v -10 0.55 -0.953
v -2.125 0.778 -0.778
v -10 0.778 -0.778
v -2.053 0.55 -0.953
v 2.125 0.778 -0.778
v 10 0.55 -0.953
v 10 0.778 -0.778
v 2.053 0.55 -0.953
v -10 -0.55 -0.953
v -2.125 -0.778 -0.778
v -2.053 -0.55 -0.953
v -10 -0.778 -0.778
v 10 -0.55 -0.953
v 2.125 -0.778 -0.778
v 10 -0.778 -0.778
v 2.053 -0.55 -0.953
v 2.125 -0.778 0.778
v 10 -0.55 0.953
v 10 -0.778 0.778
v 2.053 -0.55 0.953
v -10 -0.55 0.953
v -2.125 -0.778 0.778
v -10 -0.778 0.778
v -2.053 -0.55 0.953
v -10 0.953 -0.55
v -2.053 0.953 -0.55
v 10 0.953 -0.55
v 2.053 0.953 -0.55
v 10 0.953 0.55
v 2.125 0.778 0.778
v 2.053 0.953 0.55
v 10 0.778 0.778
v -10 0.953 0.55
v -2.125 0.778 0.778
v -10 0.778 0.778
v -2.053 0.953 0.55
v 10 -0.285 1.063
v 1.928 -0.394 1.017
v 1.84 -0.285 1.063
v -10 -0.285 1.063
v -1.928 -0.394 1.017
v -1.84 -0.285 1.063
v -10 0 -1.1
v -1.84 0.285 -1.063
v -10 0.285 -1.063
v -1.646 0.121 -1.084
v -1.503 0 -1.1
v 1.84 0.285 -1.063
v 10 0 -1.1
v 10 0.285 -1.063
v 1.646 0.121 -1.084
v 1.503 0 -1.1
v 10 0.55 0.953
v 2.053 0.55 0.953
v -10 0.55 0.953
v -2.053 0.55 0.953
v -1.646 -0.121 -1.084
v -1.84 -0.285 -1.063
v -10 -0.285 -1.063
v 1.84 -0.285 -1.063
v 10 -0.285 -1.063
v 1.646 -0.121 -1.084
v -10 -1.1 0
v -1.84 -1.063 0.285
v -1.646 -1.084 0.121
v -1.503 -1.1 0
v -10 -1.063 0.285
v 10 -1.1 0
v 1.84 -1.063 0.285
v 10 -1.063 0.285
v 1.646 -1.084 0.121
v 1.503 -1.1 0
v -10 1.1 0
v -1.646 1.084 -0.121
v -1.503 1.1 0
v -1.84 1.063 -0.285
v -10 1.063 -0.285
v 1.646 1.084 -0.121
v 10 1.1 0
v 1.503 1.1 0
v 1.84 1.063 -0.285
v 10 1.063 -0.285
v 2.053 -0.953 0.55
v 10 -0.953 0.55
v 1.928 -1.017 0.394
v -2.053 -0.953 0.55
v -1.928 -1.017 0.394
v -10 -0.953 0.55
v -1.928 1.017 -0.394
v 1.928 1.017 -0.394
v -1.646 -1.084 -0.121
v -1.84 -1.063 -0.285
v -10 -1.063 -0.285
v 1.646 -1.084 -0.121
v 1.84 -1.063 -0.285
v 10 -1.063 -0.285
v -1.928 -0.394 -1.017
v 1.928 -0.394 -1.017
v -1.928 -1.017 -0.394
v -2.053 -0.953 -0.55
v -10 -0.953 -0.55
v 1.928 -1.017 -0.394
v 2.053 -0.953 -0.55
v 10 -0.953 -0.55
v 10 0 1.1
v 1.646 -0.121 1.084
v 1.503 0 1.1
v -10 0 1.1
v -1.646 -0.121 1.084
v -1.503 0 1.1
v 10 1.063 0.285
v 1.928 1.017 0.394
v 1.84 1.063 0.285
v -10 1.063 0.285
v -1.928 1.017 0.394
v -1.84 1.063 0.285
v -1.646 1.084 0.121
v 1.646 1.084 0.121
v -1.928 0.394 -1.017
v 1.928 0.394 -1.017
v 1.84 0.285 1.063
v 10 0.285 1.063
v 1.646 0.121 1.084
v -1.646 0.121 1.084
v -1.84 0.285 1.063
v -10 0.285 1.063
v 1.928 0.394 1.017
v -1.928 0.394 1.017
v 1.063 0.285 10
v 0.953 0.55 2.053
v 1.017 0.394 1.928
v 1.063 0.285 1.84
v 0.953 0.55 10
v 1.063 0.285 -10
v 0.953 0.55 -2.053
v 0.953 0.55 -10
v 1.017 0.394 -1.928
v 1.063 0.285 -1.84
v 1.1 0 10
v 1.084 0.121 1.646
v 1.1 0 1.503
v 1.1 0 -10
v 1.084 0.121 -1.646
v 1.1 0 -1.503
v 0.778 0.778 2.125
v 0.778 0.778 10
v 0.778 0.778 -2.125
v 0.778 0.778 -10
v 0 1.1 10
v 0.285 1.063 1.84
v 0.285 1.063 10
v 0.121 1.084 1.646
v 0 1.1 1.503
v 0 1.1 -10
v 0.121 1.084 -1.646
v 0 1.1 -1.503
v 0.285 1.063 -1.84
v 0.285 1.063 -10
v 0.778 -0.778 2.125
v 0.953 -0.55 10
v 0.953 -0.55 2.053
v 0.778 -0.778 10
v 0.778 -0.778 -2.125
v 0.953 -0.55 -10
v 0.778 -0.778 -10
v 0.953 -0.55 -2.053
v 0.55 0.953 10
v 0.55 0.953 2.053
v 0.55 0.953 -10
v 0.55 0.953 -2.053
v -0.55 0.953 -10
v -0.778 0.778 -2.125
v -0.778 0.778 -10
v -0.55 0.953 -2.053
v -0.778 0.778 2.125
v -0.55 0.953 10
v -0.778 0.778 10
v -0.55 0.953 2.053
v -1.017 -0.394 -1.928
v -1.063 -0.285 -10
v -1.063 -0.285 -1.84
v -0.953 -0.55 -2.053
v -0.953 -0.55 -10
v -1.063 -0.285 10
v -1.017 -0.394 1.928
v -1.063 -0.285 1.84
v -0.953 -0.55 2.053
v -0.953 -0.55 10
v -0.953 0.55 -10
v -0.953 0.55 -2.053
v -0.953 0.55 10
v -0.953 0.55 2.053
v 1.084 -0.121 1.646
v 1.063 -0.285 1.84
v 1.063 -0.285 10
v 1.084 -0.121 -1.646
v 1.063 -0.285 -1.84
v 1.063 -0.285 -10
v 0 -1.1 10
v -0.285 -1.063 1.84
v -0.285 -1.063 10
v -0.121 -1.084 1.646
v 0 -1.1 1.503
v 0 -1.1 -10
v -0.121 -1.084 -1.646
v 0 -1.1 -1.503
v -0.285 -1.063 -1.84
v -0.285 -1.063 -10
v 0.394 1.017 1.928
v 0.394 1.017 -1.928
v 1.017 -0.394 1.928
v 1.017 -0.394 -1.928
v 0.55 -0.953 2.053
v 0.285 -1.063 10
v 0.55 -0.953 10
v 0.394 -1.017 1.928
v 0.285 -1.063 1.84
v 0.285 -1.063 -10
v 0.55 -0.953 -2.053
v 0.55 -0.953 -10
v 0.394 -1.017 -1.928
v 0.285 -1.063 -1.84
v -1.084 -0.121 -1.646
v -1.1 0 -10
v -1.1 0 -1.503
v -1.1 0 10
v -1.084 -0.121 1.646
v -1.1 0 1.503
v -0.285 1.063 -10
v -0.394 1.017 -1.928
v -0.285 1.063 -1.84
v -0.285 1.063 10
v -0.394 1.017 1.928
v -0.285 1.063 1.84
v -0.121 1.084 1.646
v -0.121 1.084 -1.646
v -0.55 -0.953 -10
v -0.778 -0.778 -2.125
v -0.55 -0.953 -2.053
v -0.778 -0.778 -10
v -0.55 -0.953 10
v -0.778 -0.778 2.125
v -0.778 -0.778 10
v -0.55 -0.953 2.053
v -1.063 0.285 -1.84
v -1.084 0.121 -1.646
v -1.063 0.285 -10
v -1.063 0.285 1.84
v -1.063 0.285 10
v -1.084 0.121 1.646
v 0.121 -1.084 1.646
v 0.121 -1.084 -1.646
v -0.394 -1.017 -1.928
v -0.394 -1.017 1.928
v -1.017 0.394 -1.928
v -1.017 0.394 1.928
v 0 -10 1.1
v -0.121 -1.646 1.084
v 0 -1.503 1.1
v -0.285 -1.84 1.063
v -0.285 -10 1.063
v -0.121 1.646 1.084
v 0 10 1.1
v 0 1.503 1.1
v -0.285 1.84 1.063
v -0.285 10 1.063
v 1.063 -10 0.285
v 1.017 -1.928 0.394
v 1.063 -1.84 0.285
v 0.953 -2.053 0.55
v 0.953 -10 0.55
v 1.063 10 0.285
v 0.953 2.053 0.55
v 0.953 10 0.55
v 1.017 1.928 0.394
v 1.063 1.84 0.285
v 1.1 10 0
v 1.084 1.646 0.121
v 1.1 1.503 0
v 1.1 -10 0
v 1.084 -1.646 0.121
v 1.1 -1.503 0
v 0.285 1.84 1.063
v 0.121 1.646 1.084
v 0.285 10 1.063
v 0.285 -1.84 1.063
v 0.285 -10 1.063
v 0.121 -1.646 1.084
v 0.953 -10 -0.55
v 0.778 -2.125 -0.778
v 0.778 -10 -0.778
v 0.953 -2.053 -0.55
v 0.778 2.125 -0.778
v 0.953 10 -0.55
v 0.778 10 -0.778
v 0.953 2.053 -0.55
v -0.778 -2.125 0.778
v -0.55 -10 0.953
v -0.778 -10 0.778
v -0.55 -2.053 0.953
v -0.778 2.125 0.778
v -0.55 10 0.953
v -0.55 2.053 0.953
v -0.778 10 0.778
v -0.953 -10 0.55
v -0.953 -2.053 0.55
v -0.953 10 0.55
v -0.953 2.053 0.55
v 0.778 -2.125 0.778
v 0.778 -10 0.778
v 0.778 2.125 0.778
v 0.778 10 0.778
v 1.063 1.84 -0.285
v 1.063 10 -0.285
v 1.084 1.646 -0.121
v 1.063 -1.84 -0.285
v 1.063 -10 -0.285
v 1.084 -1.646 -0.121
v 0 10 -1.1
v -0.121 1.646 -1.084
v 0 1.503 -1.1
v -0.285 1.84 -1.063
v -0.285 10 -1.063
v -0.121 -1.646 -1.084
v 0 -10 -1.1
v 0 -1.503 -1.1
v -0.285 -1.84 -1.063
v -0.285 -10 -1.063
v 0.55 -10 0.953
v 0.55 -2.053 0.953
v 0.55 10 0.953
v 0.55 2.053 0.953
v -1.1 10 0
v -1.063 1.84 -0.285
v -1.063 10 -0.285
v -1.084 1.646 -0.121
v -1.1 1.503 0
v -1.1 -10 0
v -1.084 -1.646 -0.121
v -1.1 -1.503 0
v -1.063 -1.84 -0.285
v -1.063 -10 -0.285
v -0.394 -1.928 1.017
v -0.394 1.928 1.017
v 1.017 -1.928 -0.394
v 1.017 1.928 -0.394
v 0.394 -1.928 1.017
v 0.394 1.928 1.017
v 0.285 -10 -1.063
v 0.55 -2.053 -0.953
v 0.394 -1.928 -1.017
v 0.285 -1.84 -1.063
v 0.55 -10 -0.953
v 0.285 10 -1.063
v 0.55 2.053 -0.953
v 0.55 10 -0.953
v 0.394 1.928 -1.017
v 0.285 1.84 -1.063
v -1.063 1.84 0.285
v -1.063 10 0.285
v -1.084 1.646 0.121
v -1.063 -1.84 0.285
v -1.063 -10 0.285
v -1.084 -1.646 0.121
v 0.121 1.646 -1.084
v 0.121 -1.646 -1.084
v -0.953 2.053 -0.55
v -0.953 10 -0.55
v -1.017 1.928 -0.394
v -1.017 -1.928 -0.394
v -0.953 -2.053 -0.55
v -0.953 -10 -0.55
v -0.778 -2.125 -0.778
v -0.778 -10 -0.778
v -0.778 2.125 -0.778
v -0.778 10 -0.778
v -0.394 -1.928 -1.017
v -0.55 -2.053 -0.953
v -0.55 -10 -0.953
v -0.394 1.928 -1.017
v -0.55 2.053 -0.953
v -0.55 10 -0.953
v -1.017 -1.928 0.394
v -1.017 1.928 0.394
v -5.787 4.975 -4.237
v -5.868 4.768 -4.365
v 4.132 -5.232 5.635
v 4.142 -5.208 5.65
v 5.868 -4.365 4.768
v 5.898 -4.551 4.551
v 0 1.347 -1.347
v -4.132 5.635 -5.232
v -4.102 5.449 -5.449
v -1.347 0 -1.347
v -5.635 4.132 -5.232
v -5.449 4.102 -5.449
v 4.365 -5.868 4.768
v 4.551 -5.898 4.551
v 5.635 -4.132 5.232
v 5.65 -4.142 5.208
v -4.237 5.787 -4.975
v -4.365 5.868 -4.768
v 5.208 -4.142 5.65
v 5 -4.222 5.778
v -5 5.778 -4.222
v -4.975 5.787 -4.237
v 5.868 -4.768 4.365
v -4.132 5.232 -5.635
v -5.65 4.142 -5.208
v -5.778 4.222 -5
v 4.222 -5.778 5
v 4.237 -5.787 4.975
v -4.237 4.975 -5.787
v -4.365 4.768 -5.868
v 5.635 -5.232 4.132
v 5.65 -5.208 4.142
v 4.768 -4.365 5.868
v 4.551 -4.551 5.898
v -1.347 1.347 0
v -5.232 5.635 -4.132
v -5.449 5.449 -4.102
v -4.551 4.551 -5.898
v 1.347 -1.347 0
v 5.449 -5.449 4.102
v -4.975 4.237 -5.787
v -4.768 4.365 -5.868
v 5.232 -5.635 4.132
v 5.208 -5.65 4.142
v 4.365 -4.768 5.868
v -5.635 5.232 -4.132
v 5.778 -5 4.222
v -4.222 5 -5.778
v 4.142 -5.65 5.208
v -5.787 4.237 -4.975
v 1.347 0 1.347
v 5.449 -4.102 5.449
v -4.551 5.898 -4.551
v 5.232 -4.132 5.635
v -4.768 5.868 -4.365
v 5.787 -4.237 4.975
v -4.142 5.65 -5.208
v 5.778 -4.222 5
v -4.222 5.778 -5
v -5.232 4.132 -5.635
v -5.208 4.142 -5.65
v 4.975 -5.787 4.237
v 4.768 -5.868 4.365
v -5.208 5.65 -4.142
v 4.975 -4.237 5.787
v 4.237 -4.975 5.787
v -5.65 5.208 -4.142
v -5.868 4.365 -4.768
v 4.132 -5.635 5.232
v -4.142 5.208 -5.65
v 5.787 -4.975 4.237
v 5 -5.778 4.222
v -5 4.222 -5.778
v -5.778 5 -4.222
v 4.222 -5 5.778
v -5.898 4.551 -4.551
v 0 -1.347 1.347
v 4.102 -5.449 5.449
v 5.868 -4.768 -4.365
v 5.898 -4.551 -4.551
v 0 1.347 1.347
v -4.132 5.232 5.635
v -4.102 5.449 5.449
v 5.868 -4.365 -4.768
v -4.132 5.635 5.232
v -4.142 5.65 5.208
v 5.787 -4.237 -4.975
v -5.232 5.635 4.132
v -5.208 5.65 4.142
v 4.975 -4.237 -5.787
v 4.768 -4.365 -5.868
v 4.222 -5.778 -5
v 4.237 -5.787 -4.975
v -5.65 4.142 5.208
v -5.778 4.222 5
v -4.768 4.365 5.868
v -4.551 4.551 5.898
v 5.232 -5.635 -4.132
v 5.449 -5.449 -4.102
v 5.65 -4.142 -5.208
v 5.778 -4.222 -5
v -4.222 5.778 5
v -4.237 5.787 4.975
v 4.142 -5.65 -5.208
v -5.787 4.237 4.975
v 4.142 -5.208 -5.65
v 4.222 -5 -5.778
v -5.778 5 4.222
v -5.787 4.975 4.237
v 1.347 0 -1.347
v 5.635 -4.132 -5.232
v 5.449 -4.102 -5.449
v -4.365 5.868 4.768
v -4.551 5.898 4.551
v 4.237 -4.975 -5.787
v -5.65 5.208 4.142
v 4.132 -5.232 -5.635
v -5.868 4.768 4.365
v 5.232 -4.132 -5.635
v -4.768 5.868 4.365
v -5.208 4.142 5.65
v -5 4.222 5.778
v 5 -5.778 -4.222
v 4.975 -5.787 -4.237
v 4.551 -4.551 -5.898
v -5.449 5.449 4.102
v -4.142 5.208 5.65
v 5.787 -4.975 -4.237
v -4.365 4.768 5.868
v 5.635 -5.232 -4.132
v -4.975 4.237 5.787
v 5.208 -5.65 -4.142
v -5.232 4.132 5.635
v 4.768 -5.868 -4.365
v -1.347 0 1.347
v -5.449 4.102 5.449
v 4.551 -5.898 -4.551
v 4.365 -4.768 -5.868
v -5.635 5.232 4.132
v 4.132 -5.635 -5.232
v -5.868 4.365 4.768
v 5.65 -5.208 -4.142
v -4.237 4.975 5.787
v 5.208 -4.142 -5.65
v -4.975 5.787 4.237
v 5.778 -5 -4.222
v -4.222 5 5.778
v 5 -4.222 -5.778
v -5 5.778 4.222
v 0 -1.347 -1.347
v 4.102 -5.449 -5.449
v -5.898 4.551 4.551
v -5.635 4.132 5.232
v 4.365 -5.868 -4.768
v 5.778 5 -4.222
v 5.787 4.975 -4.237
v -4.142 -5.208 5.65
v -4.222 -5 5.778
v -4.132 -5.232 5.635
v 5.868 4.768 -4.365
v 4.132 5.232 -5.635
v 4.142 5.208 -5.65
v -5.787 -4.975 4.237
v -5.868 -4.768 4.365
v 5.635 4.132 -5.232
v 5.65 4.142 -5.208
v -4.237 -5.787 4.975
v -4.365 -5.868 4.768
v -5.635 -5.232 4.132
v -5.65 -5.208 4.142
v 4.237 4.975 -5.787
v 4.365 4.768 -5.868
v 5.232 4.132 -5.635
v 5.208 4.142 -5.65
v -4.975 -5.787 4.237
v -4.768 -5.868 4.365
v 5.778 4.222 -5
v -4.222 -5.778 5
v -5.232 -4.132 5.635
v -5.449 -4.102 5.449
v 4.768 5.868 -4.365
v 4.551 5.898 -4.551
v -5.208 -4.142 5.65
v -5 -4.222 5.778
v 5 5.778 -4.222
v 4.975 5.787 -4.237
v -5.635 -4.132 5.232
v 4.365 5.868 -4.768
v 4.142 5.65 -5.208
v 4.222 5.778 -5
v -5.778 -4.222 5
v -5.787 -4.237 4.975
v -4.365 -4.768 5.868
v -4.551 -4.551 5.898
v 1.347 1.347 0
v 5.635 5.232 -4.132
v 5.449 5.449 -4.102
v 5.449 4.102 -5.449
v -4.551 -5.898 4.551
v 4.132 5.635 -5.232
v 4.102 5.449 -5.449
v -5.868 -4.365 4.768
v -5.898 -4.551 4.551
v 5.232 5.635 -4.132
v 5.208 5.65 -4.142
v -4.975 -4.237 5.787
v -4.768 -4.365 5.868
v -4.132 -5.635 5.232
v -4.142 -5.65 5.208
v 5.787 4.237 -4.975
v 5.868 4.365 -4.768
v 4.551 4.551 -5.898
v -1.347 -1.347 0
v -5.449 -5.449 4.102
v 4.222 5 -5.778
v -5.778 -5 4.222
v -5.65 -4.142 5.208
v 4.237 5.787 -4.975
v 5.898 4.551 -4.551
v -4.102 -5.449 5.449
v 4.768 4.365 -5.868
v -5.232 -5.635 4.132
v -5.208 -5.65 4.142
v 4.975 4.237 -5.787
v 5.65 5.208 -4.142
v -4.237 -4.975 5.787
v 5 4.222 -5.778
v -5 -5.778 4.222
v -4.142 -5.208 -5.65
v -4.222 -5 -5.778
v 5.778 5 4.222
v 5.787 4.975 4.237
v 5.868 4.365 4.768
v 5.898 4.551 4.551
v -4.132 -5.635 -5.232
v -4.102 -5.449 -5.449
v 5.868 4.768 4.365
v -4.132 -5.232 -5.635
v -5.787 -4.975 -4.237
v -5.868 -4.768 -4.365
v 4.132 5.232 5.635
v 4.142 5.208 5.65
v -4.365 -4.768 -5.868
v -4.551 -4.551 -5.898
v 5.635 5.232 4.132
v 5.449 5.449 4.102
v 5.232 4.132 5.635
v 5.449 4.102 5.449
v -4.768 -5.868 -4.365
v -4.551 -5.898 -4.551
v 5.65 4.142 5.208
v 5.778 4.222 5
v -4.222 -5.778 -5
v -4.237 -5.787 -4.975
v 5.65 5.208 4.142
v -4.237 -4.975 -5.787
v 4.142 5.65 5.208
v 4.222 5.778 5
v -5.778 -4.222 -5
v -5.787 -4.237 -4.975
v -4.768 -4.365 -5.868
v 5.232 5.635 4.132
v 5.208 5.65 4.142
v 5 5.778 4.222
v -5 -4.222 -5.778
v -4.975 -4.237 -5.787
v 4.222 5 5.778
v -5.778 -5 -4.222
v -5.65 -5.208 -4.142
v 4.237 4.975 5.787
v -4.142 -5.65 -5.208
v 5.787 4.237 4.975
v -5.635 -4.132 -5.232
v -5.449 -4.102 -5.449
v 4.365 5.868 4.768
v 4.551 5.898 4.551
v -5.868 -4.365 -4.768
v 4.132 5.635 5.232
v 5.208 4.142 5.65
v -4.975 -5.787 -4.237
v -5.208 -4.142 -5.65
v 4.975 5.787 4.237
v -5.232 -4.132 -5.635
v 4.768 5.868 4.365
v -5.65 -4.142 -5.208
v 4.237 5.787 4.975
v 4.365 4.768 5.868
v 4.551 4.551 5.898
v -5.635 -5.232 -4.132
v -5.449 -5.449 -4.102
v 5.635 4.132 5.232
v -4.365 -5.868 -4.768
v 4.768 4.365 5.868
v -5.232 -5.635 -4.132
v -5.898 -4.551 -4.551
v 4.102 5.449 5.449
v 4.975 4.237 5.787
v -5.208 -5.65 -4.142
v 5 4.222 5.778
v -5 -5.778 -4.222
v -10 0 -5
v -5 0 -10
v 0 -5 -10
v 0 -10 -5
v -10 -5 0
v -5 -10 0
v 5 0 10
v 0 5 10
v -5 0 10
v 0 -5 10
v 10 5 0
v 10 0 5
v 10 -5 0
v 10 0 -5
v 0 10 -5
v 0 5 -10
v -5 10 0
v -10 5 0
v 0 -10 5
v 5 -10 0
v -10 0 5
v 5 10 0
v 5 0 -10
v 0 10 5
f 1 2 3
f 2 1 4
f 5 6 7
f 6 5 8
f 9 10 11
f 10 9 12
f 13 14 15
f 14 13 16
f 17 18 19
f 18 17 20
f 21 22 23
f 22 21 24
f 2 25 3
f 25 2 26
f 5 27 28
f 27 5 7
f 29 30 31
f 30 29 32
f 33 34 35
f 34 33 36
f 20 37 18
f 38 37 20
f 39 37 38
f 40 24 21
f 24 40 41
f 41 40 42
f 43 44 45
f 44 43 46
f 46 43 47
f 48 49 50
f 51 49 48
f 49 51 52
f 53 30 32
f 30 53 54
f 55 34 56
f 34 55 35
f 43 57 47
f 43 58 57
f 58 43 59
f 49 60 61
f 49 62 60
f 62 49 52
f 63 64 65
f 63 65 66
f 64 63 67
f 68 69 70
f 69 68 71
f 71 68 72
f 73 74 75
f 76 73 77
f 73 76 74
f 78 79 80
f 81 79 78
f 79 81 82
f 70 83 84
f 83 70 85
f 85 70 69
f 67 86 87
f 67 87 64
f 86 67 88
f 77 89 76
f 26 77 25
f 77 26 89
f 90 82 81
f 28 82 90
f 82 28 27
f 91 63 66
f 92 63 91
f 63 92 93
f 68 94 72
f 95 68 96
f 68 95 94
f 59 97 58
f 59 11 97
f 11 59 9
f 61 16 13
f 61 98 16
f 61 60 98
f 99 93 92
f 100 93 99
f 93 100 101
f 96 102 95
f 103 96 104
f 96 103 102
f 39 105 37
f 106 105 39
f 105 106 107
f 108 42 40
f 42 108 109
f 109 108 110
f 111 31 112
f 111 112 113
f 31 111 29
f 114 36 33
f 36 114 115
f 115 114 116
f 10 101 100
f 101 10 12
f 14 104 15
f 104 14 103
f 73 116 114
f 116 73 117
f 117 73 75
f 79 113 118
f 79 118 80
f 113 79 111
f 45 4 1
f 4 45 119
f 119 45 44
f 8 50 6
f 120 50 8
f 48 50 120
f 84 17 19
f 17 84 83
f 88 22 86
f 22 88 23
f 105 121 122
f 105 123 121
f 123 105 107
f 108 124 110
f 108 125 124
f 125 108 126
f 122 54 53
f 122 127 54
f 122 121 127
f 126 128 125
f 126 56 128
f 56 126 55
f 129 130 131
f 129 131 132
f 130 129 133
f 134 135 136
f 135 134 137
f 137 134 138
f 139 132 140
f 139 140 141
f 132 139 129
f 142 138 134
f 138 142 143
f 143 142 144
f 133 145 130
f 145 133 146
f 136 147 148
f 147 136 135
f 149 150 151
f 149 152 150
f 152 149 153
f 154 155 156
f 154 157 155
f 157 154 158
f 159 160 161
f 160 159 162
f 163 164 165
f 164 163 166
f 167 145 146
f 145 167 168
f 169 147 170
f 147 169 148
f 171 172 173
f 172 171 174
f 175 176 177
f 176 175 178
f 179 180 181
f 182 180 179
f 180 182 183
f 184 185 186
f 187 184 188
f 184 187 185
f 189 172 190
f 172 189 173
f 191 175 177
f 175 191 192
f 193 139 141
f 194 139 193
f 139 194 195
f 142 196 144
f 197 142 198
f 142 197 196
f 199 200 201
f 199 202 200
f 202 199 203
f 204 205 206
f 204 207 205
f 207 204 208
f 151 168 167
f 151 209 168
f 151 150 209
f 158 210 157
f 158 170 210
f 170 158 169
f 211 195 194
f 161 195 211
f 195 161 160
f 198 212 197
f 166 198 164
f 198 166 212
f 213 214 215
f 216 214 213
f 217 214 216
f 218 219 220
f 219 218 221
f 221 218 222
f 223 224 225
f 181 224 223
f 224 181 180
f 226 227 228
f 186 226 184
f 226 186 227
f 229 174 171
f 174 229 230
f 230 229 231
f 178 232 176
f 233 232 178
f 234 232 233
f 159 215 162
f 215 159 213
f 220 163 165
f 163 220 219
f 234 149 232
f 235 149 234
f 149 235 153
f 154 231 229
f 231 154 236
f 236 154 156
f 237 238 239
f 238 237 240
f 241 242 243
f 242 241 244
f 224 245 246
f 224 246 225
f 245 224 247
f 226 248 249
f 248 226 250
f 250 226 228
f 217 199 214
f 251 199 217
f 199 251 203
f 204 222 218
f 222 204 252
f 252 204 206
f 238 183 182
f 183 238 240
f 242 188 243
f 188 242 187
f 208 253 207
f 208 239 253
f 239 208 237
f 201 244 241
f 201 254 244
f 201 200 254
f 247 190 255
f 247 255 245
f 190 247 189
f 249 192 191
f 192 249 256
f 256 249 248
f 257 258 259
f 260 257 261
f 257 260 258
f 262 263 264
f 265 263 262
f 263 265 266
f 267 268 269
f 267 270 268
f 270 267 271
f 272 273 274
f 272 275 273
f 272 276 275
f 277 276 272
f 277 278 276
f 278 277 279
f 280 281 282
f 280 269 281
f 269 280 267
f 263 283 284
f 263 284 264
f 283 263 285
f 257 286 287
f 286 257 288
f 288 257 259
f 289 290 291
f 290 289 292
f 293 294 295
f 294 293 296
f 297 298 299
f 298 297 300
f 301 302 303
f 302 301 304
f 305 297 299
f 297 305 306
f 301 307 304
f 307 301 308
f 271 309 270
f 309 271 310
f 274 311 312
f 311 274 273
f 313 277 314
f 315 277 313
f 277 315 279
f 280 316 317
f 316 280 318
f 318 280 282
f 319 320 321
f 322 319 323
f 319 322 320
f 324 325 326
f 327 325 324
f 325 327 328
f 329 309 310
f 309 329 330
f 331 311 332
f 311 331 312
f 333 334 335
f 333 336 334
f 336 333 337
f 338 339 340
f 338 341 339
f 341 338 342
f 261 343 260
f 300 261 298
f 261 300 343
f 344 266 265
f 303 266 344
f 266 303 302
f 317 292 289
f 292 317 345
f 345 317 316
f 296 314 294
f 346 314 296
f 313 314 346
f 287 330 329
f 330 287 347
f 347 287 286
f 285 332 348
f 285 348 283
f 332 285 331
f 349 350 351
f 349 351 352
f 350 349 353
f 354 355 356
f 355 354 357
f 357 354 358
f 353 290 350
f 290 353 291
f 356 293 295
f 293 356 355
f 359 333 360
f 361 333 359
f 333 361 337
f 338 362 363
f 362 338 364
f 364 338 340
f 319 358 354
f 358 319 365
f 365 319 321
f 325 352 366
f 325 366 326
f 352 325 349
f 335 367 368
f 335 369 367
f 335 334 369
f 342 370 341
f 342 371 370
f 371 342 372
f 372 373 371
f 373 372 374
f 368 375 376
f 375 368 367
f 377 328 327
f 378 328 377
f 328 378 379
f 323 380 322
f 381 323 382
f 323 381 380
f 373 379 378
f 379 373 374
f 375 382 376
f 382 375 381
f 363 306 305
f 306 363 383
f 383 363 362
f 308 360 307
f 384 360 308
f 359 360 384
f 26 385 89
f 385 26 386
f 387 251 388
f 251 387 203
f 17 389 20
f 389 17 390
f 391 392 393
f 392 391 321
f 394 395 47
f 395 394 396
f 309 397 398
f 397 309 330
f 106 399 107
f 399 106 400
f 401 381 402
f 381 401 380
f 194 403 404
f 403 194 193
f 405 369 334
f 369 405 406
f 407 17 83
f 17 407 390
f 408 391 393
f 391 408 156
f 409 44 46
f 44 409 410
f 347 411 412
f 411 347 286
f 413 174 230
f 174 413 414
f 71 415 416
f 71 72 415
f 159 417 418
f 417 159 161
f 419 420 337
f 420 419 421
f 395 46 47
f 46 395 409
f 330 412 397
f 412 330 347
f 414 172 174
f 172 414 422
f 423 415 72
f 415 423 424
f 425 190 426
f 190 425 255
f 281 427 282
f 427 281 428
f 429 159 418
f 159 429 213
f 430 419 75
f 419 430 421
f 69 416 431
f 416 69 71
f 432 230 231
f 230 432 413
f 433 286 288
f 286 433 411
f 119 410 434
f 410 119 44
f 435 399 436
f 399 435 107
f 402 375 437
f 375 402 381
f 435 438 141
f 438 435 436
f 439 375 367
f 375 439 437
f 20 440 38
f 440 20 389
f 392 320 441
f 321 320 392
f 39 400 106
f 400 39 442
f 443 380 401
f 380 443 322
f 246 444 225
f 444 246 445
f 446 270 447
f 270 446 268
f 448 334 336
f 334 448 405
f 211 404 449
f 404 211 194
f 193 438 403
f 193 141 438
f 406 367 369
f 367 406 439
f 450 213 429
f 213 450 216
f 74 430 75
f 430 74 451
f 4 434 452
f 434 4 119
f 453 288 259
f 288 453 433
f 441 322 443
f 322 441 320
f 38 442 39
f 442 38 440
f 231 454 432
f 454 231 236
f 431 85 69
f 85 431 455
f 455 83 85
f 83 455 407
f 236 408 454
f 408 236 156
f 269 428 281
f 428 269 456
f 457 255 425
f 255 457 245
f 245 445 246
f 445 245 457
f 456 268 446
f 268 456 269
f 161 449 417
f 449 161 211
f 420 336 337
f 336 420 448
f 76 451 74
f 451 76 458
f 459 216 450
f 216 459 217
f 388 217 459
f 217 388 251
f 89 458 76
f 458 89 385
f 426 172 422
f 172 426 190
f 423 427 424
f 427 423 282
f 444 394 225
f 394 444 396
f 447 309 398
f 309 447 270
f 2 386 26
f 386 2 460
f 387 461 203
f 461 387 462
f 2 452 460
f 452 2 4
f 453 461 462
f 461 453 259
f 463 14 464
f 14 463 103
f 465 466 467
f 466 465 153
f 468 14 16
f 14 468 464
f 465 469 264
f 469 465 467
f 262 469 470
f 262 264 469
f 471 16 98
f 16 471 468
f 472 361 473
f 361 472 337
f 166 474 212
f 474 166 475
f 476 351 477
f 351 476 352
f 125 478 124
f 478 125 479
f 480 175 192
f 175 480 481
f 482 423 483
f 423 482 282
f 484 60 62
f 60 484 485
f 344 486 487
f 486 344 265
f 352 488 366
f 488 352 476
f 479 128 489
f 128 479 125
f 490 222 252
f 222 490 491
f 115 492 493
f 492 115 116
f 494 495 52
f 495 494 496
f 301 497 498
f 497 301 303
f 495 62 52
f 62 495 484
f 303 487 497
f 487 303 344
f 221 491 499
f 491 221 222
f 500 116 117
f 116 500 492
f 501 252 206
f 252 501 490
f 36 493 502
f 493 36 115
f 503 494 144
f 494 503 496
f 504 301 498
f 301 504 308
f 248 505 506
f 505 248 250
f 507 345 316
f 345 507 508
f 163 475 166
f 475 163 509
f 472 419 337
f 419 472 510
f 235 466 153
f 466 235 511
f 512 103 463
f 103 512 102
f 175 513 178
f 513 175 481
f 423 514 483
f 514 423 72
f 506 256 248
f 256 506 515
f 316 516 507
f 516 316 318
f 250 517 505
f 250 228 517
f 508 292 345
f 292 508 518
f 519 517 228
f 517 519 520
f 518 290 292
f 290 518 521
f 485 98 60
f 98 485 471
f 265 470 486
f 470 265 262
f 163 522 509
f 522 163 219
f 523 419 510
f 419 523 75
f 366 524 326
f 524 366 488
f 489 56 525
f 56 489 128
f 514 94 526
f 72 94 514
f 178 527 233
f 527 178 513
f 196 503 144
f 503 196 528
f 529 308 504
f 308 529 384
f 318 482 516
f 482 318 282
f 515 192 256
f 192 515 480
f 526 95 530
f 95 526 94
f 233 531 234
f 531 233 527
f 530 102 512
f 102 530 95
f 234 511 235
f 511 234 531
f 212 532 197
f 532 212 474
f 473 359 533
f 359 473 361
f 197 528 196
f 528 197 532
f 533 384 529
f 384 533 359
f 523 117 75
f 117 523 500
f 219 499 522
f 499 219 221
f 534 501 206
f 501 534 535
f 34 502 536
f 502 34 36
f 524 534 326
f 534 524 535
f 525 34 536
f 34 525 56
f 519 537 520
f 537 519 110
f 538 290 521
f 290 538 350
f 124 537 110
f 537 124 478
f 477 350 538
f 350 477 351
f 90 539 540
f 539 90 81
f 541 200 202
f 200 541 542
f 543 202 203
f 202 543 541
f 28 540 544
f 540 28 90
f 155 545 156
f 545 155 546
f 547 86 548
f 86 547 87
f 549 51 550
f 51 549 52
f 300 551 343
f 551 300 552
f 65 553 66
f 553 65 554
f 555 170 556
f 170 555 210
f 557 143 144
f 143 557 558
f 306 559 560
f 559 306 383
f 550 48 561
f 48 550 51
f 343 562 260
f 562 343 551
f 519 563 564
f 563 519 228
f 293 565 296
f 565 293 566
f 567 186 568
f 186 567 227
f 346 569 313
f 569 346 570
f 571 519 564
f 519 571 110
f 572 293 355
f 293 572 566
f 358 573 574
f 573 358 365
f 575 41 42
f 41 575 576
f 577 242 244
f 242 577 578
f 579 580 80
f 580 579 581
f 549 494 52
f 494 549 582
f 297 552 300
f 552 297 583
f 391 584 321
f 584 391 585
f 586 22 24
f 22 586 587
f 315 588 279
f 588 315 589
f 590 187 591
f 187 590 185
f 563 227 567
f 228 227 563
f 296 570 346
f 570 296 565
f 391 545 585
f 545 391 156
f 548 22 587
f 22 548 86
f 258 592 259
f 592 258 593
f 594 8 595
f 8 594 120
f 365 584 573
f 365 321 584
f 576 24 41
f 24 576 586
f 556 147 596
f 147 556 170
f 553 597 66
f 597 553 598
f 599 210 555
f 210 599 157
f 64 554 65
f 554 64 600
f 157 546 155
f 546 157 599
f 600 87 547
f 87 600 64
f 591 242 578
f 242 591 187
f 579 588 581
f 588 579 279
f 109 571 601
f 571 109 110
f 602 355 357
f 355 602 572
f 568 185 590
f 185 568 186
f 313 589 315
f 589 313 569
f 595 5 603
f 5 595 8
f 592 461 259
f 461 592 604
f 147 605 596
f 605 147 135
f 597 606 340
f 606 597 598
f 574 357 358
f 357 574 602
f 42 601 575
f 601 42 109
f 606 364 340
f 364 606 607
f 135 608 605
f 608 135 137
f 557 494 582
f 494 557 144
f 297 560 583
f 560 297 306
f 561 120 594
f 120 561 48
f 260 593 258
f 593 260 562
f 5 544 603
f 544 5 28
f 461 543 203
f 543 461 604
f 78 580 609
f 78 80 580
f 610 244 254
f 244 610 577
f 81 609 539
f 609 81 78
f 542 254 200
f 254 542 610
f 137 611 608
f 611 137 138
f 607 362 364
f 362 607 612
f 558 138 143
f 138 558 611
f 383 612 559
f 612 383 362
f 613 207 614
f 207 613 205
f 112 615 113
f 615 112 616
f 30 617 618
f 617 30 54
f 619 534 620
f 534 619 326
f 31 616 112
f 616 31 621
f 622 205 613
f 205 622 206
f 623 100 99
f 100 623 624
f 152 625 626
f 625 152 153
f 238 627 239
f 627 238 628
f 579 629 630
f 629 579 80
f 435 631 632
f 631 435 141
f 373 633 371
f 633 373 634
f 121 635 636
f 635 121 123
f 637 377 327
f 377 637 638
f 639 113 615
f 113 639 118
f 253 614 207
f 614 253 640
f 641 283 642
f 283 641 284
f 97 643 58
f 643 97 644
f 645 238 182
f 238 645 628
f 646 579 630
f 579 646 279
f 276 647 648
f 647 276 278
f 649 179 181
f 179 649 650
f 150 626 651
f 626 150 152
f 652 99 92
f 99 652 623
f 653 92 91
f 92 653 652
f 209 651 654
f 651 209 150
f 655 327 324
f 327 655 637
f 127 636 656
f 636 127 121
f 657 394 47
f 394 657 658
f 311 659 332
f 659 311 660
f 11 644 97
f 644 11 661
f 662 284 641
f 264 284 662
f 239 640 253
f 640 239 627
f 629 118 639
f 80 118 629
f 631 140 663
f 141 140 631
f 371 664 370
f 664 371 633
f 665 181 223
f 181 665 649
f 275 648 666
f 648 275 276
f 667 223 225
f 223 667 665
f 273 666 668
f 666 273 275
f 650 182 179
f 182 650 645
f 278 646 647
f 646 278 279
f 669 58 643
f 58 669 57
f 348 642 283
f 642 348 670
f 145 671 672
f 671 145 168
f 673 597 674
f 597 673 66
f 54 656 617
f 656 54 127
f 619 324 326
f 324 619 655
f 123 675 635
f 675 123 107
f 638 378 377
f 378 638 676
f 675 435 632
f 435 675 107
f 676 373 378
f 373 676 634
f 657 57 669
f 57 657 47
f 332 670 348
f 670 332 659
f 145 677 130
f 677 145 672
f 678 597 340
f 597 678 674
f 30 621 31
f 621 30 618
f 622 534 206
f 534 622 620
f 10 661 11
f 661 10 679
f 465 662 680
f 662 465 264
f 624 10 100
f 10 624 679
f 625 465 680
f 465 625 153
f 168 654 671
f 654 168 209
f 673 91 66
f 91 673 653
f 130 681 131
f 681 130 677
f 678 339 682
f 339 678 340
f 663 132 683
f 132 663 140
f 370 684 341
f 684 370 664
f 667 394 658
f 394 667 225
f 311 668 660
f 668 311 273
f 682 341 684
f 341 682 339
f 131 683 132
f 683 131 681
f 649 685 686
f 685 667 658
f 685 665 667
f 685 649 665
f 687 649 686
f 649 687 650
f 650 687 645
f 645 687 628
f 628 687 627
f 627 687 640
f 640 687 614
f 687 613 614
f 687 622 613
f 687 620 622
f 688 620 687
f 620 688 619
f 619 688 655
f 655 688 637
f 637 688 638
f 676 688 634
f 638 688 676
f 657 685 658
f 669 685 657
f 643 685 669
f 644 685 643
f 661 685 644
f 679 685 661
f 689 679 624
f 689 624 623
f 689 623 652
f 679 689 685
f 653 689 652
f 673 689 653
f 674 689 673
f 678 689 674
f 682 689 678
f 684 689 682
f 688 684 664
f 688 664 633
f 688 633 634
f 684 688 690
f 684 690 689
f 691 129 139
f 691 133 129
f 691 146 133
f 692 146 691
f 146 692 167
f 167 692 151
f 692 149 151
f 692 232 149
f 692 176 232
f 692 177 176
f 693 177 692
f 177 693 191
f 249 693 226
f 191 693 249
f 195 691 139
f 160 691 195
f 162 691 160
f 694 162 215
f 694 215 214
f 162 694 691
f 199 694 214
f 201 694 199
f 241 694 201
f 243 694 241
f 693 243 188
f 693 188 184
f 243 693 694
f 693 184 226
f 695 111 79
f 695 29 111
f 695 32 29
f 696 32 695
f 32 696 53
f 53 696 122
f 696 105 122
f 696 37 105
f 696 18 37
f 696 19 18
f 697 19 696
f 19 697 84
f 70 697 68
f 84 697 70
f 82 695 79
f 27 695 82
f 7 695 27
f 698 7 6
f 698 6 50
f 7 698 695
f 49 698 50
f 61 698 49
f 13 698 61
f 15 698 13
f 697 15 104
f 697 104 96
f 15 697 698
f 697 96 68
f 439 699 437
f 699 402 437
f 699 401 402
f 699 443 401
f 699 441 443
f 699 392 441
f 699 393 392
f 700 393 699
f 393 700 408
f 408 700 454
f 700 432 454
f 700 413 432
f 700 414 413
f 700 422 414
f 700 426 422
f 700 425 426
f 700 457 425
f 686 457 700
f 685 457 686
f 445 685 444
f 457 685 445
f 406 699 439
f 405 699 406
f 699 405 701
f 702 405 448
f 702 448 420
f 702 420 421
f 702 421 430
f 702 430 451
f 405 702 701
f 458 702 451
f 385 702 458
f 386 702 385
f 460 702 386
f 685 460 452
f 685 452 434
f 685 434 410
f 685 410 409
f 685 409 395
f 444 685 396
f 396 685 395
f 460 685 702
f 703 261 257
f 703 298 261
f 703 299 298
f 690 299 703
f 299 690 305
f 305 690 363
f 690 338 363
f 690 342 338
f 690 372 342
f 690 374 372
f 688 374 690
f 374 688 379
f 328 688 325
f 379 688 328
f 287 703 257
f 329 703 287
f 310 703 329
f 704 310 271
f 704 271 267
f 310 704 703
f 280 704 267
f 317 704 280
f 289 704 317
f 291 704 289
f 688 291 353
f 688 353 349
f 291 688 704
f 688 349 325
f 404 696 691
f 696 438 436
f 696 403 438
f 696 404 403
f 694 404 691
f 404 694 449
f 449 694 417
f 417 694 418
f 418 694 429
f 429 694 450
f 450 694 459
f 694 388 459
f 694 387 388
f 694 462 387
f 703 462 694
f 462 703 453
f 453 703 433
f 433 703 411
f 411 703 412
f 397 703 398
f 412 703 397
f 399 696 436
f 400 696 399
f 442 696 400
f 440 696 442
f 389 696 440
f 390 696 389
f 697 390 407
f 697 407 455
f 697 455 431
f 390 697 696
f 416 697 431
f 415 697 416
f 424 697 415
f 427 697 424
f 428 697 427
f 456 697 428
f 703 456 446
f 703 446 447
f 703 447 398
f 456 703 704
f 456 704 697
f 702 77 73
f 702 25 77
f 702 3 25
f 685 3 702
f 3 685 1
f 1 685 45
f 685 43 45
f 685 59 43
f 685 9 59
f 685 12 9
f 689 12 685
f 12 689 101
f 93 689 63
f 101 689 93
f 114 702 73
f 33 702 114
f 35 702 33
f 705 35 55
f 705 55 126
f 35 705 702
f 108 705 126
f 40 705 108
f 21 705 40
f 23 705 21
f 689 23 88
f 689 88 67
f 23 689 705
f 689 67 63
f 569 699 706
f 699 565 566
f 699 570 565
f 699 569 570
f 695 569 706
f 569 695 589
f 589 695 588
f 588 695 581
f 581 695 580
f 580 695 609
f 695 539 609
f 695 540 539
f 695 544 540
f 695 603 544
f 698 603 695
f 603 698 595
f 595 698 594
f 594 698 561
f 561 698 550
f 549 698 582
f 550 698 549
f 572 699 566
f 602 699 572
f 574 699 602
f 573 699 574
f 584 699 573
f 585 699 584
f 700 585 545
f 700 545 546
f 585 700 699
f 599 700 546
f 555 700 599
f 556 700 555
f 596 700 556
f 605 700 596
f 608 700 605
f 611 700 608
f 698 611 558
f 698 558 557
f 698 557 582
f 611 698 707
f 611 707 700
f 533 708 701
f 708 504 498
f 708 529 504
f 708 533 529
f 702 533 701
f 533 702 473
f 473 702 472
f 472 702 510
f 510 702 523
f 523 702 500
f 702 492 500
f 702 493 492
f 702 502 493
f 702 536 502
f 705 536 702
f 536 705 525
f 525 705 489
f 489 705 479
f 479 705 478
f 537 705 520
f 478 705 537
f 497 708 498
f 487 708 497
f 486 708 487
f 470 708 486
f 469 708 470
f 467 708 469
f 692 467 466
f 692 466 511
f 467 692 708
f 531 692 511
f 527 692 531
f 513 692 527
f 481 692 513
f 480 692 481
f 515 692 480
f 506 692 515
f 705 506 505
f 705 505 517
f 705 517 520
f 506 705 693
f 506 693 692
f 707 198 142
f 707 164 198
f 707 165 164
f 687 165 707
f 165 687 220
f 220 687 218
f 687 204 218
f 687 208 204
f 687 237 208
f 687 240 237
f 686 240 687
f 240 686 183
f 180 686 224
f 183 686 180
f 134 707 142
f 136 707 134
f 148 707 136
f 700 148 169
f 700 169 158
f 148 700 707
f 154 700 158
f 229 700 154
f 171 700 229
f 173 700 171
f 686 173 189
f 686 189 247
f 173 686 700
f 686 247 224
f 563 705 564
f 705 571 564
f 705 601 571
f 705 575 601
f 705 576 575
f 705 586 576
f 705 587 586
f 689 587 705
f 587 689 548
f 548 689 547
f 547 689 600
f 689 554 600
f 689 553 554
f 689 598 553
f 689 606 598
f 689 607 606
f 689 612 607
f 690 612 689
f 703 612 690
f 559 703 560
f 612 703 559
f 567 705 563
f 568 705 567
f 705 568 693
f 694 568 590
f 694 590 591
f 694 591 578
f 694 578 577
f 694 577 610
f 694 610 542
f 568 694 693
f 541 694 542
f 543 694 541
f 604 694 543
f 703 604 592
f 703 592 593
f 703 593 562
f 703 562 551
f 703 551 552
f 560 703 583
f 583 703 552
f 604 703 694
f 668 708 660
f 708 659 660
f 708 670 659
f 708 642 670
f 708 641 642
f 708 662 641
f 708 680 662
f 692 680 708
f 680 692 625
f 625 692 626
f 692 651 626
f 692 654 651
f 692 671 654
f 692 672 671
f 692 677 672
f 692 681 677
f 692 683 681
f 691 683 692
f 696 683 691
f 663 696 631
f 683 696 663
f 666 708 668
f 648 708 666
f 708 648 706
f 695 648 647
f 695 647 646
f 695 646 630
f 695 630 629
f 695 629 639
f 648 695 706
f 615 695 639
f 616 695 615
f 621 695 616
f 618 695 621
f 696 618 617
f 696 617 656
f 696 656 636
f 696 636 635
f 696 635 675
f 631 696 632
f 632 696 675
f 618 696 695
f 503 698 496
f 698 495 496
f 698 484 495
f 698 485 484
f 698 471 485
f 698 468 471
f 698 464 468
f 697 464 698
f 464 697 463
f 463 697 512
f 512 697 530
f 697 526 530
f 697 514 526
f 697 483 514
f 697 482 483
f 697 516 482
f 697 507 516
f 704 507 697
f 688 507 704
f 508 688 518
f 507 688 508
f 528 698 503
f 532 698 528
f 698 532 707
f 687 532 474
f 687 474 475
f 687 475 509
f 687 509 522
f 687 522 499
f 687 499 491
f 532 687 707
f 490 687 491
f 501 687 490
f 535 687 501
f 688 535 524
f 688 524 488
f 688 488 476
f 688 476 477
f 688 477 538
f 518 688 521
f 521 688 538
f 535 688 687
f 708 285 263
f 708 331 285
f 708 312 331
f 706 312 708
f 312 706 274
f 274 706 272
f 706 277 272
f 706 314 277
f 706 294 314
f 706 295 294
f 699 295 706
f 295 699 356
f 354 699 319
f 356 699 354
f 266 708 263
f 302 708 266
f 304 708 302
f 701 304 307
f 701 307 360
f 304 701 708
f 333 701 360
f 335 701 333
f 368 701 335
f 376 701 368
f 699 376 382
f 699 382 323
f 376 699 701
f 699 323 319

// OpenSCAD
/*
Усечённый октаэдр с отверстиями для креплений
С настраиваемыми параметрами в программе OpenSCAD.

Программист: Полозков Сергей.
Смена в Сириусе "самозаклинивающиеся структуры" в 2023 году.
*/

//Шаг сетки для решётки из усечённого октаэдра (межцентровое расстояние)
MM_GRID_STEP = 20.0;


//диаметр отвертия (диаметр описанной окружности около многоугольника детализации)
//если диаметр = 0, то отверстий нет, 2.2 = диаметр зубочистки
MM_HOLE_DIAMETER = 2.2;


//такой n-угольник для детализации крепления
HOLE_DETALISATION_IS_N_POLYGON = 24;


module m_square_pyramid_with_zero_apex_point(half = MM_GRID_STEP * 0.25, h = MM_GRID_STEP * 0.5) {
polyhedron(
  points=[ [half,0,h],[0,-half,h],[-half,-0,h],[0,half,h], // the four points at base
           [0,0,0]  ],                                 // the apex point 
  faces=[ [0,1,4],[1,2,4],[2,3,4],[3,0,4],              // each triangle side
              [0,1,2,3] ]                         //square base
 );
}

module m_square_pyramid_rotate(v = [0,0,1], a = 0) {
    rotate(v=v, a=a)
        m_square_pyramid_with_zero_apex_point();
}

module m_cylinder(rotate_axe=[0,0,1], rotate_deg=0, d=MM_HOLE_DIAMETER, half_h=(MM_GRID_STEP * 0.5) * 1.1) {
    rotate (a=rotate_deg, v=rotate_axe)
        cylinder(h=half_h*2, d=d, center=true, $fn=HOLE_DETALISATION_IS_N_POLYGON);
}


module m_all_cylinders() {
    deg = 180 - acos(-sqrt(3)/3);
    
    if (MM_HOLE_DIAMETER > 0) {
        union() {
            m_cylinder([0,+1,0], 090);
            m_cylinder([0,+1,0], 270);
        
            m_cylinder([+1,0,0], 000);
            m_cylinder([+1,0,0], 090);
            m_cylinder([+1,0,0], 180);
            m_cylinder([+1,0,0], 270);
        
  
            m_cylinder([+1,+1,0], +deg);
            m_cylinder([+1,+1,0], -deg);
            m_cylinder([+1,-1,0], +deg);
            m_cylinder([+1,-1,0], -deg);
        }
    }
}

module m_truncated_octahedron() {
    hull() {
        m_square_pyramid_rotate([0,1,0],090);
        m_square_pyramid_rotate([0,1,0],270);
    
        m_square_pyramid_rotate([1,0,0],000);
        m_square_pyramid_rotate([1,0,0],090);
        m_square_pyramid_rotate([1,0,0],180);
        m_square_pyramid_rotate([1,0,0],270);
    }
}

difference() {
    m_truncated_octahedron();
    m_all_cylinders();
}
